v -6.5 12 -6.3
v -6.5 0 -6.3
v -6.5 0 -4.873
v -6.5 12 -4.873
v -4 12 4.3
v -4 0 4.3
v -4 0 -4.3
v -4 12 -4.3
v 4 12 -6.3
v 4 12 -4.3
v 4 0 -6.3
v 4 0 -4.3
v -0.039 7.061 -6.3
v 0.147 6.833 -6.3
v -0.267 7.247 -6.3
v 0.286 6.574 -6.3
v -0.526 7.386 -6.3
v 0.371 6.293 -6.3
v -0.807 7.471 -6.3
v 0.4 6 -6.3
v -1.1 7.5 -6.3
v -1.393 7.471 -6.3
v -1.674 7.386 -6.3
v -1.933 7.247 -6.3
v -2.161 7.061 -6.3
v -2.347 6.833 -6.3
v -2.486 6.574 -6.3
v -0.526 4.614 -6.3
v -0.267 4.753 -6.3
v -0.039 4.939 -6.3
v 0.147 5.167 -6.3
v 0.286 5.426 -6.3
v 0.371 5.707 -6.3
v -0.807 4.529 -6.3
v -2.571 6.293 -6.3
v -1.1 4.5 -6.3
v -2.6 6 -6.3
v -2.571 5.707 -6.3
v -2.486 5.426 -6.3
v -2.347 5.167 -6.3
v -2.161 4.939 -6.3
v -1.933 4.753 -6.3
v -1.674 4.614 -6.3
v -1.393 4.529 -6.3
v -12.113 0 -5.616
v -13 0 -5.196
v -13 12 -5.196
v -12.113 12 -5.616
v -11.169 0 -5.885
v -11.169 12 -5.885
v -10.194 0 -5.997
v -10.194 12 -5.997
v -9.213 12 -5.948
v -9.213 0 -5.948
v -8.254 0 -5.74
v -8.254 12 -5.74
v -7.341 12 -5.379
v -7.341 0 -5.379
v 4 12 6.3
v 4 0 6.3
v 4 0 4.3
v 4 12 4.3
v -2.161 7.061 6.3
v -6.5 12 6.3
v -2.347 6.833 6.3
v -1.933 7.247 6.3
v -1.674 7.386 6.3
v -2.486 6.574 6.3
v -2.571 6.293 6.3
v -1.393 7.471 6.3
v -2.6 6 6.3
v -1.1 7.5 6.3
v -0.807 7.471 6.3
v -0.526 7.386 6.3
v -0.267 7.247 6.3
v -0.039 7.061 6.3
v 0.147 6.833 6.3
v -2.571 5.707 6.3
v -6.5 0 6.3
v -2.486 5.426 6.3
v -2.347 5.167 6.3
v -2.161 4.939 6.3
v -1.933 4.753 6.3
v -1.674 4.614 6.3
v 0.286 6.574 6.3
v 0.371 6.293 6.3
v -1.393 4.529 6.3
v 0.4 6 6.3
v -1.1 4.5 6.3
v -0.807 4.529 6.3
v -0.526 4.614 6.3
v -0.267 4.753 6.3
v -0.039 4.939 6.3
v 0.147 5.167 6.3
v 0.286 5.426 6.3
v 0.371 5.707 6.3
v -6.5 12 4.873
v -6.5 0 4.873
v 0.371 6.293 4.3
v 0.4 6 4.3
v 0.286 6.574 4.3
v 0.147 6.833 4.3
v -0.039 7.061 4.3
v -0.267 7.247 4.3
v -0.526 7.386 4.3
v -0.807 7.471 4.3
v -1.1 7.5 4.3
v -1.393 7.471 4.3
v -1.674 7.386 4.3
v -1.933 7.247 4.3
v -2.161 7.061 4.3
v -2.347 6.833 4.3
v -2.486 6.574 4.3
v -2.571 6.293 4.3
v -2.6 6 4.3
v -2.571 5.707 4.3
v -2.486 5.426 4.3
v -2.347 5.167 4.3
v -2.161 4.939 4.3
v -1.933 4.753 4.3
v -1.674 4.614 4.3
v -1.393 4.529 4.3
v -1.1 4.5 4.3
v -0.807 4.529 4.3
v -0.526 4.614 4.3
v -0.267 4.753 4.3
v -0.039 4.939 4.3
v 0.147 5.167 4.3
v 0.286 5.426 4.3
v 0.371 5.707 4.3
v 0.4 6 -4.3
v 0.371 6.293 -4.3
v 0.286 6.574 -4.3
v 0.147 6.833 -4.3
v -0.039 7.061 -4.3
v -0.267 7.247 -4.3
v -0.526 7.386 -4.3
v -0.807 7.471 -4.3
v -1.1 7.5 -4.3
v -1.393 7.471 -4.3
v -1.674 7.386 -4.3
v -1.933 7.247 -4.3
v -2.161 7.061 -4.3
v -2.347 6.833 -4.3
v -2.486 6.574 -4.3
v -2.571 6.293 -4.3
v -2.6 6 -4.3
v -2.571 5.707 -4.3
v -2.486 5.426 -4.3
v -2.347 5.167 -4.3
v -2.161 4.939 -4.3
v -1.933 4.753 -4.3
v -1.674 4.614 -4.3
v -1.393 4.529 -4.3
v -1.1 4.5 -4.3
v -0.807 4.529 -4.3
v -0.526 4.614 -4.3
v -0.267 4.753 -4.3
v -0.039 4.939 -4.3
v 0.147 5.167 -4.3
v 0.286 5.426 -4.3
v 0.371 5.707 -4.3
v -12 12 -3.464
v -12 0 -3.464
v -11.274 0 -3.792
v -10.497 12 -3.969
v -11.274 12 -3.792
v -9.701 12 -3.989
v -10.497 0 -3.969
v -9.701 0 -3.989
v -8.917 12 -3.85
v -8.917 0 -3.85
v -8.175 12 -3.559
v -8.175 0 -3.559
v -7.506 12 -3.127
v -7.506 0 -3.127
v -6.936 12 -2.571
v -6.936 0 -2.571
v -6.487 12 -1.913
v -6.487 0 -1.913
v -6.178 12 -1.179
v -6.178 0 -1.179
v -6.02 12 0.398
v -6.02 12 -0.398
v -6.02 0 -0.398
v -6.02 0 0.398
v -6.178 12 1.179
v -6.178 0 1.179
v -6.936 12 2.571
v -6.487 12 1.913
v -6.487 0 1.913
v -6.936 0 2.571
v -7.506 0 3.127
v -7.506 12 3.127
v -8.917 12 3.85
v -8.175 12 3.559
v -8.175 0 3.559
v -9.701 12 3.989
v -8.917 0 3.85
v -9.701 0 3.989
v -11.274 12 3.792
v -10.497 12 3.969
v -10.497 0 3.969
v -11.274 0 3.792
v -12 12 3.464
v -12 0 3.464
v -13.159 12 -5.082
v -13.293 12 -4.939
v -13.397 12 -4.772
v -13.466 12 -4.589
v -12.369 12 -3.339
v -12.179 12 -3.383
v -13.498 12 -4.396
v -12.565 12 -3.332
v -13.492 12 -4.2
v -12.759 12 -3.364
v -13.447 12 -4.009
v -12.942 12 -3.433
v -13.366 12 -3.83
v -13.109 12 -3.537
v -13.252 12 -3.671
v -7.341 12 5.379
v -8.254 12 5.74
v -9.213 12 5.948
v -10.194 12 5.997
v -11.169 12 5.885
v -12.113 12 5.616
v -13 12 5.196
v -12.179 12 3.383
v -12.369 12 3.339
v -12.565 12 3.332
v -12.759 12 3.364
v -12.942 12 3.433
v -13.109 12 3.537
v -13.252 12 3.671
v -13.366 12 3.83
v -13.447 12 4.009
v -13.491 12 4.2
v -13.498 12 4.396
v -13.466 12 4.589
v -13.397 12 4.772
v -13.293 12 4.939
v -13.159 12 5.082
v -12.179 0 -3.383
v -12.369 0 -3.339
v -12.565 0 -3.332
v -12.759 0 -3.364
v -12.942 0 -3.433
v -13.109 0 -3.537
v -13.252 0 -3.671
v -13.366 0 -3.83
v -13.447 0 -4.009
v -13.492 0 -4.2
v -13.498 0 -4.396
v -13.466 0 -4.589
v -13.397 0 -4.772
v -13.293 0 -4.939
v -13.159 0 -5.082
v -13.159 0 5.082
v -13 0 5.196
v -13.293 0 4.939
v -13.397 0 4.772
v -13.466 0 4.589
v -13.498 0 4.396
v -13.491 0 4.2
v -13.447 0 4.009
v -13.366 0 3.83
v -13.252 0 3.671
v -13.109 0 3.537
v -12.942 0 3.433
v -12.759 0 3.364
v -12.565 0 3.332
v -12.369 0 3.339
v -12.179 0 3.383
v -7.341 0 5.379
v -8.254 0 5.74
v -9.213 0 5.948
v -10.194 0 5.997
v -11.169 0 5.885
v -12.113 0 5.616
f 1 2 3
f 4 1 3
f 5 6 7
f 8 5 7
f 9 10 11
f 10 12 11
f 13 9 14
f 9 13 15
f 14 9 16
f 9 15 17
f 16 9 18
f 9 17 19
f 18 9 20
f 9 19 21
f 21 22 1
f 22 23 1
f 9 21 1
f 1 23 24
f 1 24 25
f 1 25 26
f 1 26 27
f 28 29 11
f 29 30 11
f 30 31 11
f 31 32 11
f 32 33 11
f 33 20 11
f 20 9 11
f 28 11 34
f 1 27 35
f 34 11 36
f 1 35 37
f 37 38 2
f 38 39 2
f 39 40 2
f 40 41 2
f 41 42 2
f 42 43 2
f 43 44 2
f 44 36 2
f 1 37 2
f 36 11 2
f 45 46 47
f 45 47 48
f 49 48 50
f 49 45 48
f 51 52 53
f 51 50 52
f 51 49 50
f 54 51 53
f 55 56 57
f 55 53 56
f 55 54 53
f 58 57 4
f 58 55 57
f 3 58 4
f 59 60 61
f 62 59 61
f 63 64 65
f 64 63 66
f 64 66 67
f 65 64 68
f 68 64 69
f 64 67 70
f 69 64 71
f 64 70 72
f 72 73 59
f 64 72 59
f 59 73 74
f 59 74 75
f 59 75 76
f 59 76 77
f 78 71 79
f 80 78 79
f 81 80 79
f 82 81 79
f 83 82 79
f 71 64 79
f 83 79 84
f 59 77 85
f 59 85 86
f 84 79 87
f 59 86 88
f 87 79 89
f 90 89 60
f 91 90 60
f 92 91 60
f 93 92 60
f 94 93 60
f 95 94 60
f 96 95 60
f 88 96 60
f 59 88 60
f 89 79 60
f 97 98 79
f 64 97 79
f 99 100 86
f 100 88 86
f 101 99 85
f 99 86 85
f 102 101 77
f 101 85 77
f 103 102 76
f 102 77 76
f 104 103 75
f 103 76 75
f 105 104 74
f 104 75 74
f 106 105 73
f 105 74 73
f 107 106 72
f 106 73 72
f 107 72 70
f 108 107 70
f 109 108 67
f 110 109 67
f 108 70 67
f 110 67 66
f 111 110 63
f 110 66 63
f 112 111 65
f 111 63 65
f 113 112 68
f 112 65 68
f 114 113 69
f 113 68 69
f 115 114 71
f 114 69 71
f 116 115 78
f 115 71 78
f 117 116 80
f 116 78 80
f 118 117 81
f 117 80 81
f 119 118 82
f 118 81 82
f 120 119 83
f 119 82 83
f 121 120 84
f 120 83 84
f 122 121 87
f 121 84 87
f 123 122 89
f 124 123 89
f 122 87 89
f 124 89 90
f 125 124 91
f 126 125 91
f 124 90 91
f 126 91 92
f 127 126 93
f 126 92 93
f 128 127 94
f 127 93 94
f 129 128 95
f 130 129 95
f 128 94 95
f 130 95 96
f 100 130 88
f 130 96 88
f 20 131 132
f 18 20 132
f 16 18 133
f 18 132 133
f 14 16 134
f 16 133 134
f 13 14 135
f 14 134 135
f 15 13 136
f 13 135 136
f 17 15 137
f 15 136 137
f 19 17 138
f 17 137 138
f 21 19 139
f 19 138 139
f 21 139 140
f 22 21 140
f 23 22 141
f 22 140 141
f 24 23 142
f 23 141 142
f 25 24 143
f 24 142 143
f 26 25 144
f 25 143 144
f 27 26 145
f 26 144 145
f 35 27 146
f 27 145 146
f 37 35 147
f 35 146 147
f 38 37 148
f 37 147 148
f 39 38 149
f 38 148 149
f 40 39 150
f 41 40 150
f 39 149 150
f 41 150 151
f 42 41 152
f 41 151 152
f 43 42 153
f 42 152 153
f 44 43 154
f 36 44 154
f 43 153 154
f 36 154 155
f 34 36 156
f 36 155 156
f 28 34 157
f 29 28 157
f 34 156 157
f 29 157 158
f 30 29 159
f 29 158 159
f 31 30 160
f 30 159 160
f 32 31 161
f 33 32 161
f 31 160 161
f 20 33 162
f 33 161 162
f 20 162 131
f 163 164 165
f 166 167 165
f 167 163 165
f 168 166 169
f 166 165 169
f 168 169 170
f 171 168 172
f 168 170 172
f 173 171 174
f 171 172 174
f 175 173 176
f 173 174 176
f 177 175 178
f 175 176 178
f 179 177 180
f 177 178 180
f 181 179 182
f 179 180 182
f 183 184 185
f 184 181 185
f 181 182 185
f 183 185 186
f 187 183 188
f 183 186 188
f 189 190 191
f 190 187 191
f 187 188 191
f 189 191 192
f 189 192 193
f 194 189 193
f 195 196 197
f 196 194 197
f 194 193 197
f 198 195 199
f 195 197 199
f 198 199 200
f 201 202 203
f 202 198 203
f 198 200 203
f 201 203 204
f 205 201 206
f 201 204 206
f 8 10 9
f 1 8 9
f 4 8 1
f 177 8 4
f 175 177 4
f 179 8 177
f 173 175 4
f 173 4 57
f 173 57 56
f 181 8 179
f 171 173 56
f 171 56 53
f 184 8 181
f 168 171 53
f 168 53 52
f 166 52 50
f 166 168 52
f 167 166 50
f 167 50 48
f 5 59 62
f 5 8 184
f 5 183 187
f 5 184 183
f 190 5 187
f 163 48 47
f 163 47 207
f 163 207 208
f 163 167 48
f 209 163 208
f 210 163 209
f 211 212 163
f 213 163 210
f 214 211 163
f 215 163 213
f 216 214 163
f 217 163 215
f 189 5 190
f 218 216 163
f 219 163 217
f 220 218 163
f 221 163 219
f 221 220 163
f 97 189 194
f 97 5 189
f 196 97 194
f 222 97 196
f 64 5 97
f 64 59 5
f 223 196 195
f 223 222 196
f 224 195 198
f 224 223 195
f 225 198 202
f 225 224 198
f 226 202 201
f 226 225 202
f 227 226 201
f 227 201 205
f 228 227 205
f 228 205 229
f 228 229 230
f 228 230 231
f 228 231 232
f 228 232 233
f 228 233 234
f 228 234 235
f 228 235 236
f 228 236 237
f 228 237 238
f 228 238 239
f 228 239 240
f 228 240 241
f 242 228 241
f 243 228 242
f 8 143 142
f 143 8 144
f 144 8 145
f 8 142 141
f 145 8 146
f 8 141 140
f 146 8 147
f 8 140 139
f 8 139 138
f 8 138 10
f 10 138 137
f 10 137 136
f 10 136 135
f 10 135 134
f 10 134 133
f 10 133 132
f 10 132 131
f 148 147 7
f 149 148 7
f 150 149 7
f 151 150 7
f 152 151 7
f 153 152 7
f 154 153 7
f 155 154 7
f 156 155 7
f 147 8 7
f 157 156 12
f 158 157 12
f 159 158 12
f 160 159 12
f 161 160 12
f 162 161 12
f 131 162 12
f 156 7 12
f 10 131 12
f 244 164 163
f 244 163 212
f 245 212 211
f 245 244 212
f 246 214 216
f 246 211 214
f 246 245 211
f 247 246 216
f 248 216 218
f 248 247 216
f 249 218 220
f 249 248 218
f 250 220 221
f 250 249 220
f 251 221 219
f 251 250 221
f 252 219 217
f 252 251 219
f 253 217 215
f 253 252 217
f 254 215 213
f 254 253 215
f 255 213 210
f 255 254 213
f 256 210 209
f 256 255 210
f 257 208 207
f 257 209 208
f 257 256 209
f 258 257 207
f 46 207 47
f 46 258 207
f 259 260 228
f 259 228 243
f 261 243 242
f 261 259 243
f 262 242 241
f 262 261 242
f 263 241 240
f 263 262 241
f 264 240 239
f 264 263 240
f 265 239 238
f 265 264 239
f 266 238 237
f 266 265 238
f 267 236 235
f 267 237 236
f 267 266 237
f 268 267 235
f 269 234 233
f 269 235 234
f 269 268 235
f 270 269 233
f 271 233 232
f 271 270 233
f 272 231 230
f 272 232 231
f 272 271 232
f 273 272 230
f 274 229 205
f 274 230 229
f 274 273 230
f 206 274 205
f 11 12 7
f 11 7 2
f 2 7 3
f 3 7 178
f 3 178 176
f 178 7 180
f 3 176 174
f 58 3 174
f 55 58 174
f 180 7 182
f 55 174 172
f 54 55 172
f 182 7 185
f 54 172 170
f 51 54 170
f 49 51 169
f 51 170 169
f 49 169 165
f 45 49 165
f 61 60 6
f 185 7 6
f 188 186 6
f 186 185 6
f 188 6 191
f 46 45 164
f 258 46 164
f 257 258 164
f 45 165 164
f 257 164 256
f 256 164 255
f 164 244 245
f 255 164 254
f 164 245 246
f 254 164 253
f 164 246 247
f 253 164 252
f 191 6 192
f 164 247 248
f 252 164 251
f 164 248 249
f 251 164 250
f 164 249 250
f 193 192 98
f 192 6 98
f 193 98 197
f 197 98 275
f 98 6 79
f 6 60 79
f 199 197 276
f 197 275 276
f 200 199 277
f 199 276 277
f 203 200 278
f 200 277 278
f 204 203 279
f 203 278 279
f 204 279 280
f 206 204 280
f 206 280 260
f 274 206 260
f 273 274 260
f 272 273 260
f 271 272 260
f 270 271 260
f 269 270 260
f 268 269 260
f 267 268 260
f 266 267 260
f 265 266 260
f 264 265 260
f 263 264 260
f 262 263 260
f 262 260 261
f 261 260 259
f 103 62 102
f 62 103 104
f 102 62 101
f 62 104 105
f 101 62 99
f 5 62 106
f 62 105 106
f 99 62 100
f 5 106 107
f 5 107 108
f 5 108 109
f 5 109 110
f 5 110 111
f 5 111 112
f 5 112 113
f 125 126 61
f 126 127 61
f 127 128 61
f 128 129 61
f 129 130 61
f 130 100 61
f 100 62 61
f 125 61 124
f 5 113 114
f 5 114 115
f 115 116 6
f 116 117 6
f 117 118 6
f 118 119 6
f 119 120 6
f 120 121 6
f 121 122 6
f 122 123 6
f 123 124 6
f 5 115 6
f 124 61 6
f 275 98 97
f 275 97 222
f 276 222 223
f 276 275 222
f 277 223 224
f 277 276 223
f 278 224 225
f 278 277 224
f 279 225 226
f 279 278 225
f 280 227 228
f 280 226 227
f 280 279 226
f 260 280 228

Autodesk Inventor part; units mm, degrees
ref_plane "YZ Plane" through (0, 0, 0) normal (1, 0, 0) x (0, 1, 0)
ref_plane "XZ Plane" through (0, 0, 0) normal (0, 1, 0) x (-1, 0, 0)
ref_plane "XY Plane" through (0, 0, 0) normal (0, 0, 1) x (1, 0, 0)
sketch "Sketch1" plane through (0, 0, 0) normal (0, 1, 0) x (-1, 0, 0)
  line L0 (6.5, 6.3) -> (-4, 6.3)
  line L1 (-4, -6.3) -> (6.5, -6.3)
  line L2 (-4, 4.3) -> (4, 4.3)
  line L3 (4, 4.3) -> (4, -4.3)
  line L4 (4, -4.3) -> (-4, -4.3)
  arc A0 (12, 3.4641) -> (12, -3.4641) centre (10, 0) ccw
  line L5 (6.5, -6.3) -> (6.5, -4.8734)
  line L6 (6.5, 4.8734) -> (6.5, 6.3)
  line L7 (-4, 6.3) -> (-4, 4.3)
  line L8 (-4, -4.3) -> (-4, -6.3)
  arc A1 (12, 3.4641) -> (13, 5.1962) centre (12.5, 4.3301) ccw
  arc A2 (13, -5.1962) -> (12, -3.4641) centre (12.5, -4.3301) ccw
  arc A3 (6.5, -4.8734) -> (13, -5.1962) centre (10, 0) ccw
  arc A4 (13, 5.1962) -> (6.5, 4.8734) centre (10, 0) ccw
  point P0 (0, 0)
  point P1 (4, 0)
  point P2 (-6.8446, 0)
  point P3 (-6.8446, 0)
  point P4 (0, 4.3)
  point P5 (0, -4.3)
  dimension "d1" = 8
  dimension "d2" = 2.5
  dimension "d3" = 8.6
  dimension "d4" = 2
  dimension "d5" = 6
  dimension "d6" = 2.5
  dimension "d7" = 2.5
  dimension "d8" = 6
  dimension "d9" = 6
  dimension "d10" = 8
extrude "Extrusion1" add sketch "Sketch1" along normal blind 12
sketch "Sketch2" plane through (-6.5, 0, 6.3) normal (0, 0, 1) x (1, 0, 0)
  circle A0 centre (5.4, 6) radius 1.5
  line L0 (2.5, 0) -> (2.5, 12) projected
  point P0 (6.5, 0)
  dimension "d13" = 2.9
  dimension "d14" = 6
  dimension "d15" = 3
extrude "Extrusion2" cut sketch "Sketch2" against normal blind 65.75
properties part number "2mm_3mm Weight Clamp"
